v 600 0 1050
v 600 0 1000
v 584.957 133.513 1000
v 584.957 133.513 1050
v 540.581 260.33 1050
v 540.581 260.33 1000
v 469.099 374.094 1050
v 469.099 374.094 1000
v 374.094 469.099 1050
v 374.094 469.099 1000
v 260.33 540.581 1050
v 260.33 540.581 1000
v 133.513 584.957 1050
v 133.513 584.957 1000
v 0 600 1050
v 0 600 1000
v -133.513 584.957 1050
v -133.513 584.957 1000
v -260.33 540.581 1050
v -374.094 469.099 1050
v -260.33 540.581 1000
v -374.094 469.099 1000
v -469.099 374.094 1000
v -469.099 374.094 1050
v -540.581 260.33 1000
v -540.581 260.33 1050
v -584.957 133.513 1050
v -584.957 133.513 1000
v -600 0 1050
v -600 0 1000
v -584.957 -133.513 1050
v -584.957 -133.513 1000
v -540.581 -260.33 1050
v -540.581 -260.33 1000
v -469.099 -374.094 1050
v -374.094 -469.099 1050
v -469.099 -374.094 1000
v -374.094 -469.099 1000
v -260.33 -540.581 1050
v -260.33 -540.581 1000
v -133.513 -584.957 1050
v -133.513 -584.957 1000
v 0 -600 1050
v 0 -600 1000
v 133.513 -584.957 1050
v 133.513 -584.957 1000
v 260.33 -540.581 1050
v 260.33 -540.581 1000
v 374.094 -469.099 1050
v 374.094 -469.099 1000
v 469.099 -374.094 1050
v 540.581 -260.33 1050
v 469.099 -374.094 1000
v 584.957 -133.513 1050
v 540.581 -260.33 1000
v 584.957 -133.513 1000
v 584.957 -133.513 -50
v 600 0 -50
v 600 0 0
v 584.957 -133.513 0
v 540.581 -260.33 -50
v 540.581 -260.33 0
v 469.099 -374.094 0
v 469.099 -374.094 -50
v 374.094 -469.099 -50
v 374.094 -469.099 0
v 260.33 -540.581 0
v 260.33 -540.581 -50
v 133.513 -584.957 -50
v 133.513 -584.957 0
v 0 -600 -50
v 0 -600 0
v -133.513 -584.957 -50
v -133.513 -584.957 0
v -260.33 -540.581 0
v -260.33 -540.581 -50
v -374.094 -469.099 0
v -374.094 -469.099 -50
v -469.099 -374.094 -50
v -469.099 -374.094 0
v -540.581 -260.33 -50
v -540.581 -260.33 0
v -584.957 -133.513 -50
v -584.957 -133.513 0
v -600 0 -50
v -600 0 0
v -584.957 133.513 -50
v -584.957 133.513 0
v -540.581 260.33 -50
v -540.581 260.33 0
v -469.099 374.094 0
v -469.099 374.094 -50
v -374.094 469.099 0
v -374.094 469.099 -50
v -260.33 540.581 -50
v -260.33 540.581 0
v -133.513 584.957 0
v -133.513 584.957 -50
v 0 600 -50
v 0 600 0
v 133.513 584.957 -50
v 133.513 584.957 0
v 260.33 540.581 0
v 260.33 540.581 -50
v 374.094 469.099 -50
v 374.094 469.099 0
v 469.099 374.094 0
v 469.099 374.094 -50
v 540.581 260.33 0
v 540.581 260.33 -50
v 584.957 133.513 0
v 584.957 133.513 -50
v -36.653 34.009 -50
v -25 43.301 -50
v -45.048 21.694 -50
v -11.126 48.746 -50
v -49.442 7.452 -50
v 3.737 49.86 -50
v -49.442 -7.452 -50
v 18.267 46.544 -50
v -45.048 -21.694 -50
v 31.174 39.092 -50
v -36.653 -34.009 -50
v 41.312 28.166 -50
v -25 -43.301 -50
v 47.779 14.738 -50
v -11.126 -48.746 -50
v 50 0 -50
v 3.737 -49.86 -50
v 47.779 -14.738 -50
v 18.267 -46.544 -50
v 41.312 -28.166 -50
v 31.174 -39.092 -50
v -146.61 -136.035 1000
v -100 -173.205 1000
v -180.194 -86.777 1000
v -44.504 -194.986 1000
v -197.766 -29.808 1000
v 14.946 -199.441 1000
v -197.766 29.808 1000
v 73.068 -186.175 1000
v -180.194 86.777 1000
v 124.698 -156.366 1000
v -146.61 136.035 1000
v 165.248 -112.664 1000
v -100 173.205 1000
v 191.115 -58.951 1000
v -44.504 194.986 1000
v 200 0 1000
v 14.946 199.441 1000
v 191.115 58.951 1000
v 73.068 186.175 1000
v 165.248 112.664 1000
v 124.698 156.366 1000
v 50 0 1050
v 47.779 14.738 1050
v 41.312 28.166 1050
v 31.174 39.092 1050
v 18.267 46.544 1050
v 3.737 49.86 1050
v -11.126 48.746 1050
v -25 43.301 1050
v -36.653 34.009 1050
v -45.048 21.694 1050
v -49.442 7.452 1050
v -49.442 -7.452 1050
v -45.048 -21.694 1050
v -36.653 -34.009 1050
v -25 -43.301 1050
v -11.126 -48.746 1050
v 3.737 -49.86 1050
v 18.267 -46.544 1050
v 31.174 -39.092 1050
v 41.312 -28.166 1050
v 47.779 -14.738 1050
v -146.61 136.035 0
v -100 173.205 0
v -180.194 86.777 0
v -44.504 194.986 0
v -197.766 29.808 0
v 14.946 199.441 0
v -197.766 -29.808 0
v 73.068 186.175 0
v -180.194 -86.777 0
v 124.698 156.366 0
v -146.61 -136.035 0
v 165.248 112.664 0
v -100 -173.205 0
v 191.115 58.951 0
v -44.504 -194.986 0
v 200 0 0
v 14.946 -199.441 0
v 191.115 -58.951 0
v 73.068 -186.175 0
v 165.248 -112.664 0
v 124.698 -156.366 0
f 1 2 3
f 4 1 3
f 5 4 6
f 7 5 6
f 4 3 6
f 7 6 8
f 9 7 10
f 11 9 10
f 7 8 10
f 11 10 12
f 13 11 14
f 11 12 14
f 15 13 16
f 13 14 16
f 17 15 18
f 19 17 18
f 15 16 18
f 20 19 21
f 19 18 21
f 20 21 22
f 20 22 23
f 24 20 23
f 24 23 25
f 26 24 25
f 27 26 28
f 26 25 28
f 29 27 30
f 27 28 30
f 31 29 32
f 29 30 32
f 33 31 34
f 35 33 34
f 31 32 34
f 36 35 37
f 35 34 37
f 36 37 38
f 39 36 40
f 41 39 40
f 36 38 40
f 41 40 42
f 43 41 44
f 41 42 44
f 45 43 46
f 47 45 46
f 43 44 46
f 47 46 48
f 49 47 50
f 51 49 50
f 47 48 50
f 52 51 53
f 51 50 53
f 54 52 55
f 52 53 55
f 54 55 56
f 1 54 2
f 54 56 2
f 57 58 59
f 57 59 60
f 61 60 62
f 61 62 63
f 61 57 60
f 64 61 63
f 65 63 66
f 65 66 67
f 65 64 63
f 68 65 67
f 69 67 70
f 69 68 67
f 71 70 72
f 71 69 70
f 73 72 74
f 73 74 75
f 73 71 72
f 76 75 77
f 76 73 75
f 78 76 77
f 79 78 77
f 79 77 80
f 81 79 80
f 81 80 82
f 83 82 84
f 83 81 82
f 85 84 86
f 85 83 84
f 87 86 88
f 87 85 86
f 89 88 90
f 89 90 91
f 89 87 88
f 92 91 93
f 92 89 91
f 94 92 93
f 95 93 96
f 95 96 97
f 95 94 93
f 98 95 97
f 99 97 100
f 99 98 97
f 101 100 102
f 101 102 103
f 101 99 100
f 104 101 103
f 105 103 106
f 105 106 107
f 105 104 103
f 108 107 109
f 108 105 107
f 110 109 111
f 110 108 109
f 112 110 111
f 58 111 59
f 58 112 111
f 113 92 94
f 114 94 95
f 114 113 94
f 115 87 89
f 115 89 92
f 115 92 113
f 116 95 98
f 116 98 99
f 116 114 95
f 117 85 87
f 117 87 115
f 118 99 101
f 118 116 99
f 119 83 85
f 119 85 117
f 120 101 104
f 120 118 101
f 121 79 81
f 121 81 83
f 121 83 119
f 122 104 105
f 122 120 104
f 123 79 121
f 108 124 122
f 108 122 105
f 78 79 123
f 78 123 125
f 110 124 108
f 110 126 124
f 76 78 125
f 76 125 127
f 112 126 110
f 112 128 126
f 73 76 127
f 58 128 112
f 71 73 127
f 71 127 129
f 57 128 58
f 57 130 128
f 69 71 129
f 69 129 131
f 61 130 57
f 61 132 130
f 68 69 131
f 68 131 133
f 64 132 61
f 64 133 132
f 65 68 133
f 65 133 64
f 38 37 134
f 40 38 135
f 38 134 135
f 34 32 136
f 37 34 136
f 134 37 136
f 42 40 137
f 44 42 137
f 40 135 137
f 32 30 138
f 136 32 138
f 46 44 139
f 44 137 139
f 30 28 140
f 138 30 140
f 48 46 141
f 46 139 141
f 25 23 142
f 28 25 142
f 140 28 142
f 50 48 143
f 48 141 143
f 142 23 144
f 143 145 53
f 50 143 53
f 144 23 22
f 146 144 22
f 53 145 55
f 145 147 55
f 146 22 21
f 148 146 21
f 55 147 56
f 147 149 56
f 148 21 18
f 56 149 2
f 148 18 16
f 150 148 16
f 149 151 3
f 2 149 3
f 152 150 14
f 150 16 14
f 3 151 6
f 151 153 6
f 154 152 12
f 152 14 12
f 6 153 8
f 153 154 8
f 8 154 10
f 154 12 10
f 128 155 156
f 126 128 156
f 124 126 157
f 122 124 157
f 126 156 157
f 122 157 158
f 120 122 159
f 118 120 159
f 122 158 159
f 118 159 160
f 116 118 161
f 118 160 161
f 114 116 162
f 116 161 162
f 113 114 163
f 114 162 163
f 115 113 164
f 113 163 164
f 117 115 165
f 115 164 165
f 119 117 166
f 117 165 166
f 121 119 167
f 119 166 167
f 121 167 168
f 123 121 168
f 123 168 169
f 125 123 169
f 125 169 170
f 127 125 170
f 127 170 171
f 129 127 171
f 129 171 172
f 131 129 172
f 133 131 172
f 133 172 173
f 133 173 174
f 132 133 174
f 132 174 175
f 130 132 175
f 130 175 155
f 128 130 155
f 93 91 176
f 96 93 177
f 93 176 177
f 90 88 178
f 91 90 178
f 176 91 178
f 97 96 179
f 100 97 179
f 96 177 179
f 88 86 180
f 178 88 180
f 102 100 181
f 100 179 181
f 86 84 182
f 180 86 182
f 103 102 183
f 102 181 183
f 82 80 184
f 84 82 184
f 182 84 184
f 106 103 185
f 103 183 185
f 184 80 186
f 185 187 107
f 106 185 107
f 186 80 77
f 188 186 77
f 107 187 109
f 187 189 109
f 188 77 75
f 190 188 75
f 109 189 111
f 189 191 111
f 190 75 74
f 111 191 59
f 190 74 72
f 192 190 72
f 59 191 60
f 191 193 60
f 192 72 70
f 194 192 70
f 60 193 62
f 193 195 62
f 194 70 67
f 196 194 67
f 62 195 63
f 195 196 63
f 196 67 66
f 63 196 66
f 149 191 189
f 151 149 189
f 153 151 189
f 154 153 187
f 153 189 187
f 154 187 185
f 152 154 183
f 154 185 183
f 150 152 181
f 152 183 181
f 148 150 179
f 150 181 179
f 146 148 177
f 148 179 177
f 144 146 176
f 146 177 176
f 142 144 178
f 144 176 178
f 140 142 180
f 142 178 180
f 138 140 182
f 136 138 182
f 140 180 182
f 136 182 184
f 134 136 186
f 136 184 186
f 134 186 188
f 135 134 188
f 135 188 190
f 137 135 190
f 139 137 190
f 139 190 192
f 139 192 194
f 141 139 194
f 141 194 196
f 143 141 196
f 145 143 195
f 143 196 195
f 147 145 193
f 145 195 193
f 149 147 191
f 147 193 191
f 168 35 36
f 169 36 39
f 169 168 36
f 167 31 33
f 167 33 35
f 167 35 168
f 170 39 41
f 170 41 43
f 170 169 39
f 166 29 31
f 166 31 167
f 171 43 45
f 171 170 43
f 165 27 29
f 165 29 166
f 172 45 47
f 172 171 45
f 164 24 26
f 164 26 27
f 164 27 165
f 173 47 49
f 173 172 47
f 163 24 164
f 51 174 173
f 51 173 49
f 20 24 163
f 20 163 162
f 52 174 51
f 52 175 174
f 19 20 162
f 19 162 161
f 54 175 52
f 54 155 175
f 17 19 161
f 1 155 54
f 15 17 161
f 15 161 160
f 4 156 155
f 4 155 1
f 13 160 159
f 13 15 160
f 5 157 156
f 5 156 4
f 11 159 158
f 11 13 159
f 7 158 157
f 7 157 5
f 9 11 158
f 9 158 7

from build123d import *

# Parameters (mm, degrees)
SKETCH2_R           = 200
BOSS_EXTRUDE1_DEPTH = 1000
SKETCH3_R           = 600
BOSS_EXTRUDE2_DEPTH = 50
BOSS_EXTRUDE3_START = 50
SKETCH4_R           = 600
BOSS_EXTRUDE3_DEPTH = 50
SKETCH5_R           = 50
CUT_EXTRUDE1_DEPTH  = 1390.244398945


with BuildPart() as part:
    # Sketch2 → Boss-Extrude1 (new body)
    with BuildSketch(Plane.XY):
        Circle(SKETCH2_R)
    extrude(amount=BOSS_EXTRUDE1_DEPTH)

    # Sketch3 → Boss-Extrude2 (add)
    with BuildSketch(Plane.XY.offset(1000)):
        Circle(SKETCH3_R)
    extrude(amount=BOSS_EXTRUDE2_DEPTH)

    # Sketch4 → Boss-Extrude3 (add)
    with BuildSketch(Plane(origin=(0, 0, 0), x_dir=(-1, 0, 0), z_dir=(0, 0, -1)).offset(BOSS_EXTRUDE3_START)):
        with Locations(Location((0, 0, 0), (0, 0, 180))):
            Circle(SKETCH4_R)
    extrude(amount=-BOSS_EXTRUDE3_DEPTH)

    # Sketch5 → Cut-Extrude1 (cut, through all)
    with BuildSketch(Plane.XY.offset(1050)):
        Circle(SKETCH5_R)
    extrude(amount=-CUT_EXTRUDE1_DEPTH, mode=Mode.SUBTRACT)


solid = part.part
